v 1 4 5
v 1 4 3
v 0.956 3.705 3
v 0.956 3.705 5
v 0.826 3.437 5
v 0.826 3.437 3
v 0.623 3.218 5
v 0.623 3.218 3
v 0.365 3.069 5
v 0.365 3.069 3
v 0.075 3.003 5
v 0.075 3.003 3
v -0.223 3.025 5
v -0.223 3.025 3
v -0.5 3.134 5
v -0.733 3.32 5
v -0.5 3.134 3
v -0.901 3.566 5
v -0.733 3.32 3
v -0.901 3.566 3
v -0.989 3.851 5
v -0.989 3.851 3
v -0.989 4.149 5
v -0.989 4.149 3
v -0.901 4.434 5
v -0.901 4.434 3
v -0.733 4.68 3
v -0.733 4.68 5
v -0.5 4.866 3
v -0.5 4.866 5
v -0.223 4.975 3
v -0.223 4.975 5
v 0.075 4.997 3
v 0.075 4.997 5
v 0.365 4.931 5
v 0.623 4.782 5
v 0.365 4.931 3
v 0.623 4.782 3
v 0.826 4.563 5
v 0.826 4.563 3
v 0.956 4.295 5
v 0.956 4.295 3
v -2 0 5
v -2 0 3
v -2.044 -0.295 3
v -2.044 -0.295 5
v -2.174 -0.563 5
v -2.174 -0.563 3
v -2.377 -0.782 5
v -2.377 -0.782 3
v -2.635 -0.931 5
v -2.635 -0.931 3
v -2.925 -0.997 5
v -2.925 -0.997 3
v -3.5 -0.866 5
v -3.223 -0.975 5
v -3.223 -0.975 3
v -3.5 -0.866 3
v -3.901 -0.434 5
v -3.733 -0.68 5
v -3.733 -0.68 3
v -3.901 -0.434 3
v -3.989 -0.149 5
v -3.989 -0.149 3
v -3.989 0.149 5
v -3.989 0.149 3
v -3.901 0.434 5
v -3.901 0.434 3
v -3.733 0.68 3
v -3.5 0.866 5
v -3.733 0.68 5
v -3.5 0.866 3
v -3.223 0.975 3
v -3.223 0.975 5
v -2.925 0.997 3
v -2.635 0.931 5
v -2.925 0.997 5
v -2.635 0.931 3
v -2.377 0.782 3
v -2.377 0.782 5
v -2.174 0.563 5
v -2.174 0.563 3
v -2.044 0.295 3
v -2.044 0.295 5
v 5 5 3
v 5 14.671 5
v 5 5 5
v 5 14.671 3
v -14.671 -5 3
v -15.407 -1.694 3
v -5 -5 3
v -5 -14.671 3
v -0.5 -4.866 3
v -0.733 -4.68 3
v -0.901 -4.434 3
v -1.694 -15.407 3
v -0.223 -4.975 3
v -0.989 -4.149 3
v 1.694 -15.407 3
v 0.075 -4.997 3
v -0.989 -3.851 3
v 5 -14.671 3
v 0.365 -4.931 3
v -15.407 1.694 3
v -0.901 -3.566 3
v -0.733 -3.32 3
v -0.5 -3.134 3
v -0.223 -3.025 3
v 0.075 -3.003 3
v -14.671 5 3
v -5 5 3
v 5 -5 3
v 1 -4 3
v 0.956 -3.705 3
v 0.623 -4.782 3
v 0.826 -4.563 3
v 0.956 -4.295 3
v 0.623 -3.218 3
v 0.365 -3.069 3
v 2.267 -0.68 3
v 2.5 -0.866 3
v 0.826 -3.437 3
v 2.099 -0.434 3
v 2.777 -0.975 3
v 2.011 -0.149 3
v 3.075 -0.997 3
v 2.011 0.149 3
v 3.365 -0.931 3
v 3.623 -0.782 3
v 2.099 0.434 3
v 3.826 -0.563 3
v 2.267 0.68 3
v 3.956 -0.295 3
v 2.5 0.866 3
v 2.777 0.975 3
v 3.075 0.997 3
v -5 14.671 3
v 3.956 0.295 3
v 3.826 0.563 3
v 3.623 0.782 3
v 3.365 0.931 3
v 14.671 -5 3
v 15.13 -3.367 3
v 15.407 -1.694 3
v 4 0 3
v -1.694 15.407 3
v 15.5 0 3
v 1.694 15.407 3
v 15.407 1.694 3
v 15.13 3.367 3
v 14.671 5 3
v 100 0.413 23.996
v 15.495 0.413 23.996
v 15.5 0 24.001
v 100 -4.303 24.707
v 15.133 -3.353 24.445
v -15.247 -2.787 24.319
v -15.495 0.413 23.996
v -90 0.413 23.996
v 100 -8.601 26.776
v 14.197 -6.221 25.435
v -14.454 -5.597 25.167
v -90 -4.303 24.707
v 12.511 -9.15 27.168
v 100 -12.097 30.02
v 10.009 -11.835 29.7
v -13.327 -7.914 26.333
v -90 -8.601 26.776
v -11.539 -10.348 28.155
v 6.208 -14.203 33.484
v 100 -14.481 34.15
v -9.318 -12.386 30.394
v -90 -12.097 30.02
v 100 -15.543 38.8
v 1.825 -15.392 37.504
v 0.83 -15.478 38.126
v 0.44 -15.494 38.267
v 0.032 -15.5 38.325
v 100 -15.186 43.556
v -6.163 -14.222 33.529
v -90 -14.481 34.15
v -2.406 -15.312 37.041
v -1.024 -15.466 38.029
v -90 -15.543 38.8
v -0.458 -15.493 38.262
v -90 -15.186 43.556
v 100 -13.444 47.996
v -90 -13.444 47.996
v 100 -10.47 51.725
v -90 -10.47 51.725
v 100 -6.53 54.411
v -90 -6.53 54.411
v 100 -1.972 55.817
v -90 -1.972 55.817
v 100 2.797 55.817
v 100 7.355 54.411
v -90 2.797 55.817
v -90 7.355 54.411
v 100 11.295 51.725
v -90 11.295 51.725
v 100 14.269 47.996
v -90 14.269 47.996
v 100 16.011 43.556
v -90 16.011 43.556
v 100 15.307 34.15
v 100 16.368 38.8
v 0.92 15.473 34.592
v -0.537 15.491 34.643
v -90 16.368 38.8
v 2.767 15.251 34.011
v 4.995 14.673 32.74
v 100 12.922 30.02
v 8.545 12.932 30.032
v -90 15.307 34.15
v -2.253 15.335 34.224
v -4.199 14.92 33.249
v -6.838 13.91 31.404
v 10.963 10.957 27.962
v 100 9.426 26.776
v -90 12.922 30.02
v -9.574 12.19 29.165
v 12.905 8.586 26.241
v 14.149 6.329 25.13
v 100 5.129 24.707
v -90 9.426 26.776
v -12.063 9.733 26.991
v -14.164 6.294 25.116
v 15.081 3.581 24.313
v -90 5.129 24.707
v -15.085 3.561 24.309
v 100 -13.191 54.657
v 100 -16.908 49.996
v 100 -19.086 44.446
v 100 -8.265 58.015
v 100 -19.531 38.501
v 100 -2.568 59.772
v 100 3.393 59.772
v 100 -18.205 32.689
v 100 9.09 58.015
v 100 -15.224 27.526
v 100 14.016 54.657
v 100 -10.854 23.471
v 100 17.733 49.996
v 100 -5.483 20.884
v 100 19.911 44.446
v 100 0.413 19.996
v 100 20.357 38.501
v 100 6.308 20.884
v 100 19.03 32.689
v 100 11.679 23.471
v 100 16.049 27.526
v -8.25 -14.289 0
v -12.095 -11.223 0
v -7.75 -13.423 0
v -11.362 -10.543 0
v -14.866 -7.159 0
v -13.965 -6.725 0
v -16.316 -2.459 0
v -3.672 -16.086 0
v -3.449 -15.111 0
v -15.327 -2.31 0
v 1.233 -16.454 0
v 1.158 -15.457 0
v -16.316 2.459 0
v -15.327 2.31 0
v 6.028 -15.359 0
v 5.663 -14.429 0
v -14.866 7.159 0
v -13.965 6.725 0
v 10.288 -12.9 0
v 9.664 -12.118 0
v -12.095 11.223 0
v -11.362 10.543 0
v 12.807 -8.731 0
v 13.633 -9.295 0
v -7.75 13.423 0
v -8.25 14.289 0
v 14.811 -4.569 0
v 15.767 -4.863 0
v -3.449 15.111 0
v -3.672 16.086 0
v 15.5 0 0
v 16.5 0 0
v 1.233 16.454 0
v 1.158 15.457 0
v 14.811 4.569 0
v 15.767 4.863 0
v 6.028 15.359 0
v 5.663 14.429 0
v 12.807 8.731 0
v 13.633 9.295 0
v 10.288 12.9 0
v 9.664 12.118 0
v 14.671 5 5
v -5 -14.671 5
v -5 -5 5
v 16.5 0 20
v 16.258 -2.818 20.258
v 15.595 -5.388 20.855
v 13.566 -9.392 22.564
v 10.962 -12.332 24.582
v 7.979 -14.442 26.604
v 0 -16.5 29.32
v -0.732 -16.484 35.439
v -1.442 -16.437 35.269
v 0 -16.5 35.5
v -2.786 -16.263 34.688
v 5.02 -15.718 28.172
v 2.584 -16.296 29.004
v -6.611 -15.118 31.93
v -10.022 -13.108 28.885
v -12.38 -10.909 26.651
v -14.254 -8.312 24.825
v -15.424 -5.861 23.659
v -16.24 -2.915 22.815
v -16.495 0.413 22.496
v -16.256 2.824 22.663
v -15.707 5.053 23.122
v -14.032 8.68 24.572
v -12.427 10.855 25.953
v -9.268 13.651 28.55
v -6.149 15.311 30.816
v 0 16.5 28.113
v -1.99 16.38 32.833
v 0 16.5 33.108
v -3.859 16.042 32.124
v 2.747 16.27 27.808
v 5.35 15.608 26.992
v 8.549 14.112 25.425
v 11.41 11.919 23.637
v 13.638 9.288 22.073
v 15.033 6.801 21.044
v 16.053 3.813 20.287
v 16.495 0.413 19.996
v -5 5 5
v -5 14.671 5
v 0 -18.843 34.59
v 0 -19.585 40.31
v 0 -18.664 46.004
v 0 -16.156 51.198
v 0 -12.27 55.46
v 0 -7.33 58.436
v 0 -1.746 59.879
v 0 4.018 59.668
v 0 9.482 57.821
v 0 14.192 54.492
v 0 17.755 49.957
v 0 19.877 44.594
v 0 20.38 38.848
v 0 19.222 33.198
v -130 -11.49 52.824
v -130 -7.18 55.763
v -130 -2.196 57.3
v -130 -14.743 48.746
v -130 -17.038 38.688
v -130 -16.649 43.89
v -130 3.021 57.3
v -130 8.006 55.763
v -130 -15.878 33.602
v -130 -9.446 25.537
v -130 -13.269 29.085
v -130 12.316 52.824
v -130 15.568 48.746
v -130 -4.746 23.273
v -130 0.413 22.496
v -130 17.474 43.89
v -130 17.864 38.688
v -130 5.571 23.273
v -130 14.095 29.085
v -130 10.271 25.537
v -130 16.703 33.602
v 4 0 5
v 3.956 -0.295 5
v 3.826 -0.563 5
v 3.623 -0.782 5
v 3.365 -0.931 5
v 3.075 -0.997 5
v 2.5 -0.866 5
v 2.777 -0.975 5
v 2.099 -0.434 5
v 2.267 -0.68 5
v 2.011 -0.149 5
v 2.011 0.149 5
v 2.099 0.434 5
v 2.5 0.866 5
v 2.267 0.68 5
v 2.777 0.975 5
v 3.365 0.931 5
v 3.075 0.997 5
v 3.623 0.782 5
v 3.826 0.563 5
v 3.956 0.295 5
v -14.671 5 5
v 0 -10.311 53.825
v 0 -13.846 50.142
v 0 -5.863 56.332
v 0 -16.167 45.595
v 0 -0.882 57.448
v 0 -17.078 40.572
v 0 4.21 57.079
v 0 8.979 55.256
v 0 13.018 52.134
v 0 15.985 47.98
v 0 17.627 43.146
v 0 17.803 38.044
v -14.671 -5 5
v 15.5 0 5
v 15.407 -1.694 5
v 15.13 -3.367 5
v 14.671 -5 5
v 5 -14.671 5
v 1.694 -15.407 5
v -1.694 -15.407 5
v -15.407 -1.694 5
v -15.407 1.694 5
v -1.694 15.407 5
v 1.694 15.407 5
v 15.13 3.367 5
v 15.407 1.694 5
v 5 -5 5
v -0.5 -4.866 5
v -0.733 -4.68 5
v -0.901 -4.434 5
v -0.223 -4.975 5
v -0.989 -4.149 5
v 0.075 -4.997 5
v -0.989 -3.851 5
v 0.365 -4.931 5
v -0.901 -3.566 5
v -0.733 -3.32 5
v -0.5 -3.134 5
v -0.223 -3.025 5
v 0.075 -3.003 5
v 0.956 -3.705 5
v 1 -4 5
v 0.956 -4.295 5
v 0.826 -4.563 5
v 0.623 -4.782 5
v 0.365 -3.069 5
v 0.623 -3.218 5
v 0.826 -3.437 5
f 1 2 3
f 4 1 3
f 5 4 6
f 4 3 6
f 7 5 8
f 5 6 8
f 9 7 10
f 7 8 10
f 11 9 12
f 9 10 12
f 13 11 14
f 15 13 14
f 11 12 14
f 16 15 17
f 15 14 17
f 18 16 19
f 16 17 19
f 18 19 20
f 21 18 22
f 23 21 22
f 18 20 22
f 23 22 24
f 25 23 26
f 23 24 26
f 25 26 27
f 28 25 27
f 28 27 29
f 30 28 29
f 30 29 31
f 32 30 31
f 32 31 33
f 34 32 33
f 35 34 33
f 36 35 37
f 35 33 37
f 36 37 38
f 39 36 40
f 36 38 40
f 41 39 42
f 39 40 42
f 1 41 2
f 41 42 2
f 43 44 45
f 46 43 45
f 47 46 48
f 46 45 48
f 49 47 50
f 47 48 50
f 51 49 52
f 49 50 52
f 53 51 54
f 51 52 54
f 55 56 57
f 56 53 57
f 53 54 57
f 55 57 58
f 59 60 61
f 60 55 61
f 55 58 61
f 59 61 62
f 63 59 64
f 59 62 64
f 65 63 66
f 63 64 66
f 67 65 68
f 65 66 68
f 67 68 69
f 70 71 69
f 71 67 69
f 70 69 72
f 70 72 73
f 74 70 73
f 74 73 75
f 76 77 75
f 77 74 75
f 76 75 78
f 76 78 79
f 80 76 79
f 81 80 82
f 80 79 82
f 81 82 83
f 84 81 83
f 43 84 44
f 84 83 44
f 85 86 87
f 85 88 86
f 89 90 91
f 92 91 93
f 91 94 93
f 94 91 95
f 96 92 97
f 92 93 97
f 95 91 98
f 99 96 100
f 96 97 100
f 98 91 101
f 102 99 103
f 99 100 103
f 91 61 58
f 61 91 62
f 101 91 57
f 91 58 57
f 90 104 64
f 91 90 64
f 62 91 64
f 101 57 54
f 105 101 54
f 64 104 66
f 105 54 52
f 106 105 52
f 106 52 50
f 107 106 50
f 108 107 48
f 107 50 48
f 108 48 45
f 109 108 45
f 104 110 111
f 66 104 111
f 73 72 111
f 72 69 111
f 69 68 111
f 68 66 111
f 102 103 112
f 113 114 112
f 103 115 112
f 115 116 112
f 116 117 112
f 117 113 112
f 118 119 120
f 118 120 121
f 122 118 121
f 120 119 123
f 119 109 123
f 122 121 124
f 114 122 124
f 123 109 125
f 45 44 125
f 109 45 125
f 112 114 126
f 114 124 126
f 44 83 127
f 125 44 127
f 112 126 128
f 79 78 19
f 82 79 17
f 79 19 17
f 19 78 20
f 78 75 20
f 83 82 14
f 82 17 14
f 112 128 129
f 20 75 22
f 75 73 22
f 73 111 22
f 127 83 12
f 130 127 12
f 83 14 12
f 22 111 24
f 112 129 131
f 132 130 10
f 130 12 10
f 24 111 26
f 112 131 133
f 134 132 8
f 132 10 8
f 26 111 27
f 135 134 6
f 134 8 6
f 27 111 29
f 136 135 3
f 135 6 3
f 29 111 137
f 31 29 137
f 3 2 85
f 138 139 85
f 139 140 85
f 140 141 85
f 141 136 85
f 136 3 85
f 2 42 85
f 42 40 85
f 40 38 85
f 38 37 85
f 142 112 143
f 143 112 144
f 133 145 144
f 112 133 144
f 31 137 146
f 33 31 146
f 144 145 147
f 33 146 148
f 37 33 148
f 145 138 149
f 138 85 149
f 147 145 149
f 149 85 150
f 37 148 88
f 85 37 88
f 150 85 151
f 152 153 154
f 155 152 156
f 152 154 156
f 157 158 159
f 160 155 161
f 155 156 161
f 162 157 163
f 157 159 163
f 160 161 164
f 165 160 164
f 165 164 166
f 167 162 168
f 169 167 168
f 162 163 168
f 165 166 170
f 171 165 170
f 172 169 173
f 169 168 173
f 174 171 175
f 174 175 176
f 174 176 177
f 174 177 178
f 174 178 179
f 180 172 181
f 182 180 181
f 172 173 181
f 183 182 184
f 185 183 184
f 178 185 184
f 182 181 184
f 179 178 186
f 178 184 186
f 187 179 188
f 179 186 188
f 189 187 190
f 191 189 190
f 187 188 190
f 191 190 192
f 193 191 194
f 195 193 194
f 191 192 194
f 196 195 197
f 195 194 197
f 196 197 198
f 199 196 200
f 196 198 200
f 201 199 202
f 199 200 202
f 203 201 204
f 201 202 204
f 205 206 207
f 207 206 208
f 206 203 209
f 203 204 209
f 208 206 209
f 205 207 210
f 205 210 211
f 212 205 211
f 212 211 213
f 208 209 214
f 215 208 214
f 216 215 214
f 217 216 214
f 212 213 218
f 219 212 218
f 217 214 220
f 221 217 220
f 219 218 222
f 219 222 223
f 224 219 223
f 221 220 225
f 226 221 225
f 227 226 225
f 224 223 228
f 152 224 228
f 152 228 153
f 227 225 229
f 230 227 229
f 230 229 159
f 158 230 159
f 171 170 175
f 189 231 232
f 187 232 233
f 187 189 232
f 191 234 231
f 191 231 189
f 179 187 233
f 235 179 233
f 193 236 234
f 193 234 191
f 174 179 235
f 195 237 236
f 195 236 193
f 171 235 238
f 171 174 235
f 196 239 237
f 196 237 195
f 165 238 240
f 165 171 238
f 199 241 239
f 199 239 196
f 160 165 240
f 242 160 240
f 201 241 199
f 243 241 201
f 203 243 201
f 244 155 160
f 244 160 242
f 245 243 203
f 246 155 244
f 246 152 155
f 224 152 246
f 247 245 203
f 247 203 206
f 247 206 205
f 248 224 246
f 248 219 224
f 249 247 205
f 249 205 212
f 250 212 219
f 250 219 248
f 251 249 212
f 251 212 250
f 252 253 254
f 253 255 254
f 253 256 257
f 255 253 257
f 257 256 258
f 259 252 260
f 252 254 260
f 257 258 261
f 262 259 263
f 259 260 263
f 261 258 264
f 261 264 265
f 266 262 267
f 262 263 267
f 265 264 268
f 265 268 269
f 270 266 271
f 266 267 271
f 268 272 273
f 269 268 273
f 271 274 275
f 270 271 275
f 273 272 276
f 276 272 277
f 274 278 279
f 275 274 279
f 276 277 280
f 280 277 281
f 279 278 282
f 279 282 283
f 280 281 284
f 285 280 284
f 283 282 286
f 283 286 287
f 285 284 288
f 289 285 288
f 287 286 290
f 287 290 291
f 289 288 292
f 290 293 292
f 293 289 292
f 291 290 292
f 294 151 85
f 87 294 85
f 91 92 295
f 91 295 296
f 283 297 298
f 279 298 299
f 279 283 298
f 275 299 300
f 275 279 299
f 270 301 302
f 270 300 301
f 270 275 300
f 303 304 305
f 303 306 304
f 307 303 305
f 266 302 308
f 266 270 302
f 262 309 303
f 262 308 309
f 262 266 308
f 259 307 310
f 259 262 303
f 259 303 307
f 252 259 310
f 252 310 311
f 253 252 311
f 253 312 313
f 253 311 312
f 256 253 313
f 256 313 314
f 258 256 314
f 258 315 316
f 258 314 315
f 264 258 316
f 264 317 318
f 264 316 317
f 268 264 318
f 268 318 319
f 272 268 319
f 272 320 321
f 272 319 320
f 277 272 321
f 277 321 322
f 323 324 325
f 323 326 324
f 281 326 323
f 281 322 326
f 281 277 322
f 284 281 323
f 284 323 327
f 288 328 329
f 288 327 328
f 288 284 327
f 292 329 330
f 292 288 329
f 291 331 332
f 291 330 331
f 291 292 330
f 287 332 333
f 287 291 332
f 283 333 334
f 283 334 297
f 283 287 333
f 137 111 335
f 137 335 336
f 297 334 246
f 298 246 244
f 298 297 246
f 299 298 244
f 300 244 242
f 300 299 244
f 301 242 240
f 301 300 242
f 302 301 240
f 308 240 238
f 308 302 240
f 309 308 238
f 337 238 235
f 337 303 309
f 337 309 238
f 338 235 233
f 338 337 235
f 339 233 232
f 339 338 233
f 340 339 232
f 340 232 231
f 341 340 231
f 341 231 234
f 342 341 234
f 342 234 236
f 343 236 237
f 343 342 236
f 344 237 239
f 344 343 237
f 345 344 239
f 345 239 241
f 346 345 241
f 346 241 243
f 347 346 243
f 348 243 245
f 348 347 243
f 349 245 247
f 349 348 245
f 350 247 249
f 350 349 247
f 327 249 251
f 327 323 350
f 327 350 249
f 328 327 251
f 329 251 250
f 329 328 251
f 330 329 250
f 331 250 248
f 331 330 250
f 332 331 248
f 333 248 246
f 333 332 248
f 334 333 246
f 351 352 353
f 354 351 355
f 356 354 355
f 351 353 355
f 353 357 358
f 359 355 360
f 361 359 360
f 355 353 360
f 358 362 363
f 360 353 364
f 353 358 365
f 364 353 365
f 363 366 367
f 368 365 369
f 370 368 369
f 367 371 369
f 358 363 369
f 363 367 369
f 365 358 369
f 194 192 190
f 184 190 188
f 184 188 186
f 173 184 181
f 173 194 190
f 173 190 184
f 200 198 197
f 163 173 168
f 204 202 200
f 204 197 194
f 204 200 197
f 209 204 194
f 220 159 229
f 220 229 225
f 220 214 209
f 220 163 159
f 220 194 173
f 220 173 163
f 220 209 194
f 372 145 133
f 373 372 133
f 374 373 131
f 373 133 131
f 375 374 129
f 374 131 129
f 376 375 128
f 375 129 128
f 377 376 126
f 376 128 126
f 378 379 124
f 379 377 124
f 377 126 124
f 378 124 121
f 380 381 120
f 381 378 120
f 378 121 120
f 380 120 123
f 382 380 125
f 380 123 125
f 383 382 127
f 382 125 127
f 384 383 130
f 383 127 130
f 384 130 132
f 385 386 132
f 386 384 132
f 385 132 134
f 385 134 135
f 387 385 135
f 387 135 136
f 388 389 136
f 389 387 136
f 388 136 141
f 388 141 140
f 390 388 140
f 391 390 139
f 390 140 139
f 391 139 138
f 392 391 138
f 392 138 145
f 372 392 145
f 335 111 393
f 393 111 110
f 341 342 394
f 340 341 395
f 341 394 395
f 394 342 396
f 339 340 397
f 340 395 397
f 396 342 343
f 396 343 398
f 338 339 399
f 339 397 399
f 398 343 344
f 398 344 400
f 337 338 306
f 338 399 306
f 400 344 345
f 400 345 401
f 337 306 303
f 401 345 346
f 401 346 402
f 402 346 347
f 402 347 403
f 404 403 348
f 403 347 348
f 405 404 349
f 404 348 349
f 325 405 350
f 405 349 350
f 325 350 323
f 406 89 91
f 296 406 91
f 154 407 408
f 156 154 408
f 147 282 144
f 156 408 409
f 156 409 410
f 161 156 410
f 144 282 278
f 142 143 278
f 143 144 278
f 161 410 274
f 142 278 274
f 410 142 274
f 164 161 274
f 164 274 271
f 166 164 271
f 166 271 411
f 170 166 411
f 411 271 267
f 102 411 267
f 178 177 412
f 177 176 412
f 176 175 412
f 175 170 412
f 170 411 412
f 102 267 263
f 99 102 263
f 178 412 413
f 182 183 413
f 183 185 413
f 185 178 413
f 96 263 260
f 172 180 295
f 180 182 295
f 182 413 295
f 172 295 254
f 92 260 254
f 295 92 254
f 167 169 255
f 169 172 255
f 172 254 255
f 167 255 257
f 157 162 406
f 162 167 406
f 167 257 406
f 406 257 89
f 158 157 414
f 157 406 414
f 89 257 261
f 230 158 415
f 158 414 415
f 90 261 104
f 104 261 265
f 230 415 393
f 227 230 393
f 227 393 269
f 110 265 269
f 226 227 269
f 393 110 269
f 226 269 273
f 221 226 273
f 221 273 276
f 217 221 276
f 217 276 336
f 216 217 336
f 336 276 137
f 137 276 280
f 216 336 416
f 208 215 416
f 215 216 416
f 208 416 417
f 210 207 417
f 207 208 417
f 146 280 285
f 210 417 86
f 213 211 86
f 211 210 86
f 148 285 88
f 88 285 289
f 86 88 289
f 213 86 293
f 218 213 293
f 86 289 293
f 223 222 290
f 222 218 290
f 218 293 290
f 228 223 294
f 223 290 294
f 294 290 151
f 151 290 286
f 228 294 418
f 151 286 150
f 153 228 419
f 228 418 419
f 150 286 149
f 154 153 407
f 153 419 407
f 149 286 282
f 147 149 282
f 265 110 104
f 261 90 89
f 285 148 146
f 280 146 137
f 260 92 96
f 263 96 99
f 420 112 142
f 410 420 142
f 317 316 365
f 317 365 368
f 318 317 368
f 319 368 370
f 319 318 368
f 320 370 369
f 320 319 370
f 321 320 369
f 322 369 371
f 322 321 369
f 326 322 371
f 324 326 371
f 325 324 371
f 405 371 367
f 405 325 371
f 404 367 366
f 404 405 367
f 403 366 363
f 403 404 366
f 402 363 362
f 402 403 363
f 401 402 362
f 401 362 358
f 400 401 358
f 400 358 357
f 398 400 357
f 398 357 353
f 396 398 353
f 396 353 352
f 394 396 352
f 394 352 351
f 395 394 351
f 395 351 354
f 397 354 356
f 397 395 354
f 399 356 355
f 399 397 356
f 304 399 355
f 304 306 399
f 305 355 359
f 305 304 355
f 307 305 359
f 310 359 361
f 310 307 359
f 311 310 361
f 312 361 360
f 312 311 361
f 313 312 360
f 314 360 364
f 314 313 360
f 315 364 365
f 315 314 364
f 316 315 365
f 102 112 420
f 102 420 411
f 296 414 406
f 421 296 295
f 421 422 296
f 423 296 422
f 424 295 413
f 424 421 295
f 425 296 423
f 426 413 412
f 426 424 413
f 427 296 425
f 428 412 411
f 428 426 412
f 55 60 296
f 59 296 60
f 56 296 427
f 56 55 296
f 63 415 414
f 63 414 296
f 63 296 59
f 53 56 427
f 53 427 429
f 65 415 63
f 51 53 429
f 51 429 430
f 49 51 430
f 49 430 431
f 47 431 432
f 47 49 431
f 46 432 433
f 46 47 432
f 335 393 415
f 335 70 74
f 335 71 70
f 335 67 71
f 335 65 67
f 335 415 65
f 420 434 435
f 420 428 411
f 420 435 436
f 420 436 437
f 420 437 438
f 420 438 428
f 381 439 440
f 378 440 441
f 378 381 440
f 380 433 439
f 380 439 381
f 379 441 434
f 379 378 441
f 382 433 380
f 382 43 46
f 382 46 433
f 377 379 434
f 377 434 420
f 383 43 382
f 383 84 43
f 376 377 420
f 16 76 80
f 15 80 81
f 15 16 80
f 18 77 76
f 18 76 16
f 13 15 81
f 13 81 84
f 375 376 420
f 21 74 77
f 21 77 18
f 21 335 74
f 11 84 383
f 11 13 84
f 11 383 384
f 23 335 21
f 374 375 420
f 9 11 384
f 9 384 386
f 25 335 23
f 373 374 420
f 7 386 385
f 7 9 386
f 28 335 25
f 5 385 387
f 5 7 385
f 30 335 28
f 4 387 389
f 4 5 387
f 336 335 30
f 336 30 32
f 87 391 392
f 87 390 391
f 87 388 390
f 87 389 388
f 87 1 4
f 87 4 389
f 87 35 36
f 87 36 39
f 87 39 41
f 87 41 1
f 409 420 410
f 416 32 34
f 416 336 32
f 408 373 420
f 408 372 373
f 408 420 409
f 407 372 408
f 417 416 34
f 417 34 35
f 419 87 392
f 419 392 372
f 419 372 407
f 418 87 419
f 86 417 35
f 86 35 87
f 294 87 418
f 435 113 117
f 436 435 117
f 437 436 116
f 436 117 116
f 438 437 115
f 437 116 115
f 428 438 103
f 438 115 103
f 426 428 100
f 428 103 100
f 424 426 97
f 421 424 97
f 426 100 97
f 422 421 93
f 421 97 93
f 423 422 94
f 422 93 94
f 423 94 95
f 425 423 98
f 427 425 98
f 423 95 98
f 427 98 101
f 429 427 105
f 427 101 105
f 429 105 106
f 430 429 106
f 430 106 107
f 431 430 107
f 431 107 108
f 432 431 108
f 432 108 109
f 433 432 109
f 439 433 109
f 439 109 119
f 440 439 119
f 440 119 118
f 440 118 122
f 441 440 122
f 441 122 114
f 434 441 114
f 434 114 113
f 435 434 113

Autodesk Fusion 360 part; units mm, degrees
sketch "Sketch1" plane through (0, 0, 0) normal (0, 0, 1) x (1, 0, 0)
  circle A0 centre (0, 0) radius 16.5
  circle A1 centre (0, 0) radius 15.5
  line L0 (-25, -5) -> (25, -5)
  line L1 (25, -5) -> (25, 5)
  line L2 (25, 5) -> (-25, 5)
  line L3 (-25, 5) -> (-25, -5)
  line L4 (-25, -5) -> (25, 5) construction
  line L5 (25, -5) -> (-25, 5) construction
  line L6 (-5, 25) -> (5, 25)
  line L7 (5, 25) -> (5, -25)
  line L8 (5, -25) -> (-5, -25)
  line L9 (-5, -25) -> (-5, 25)
  line L10 (-5, 25) -> (5, -25) construction
  line L11 (5, 25) -> (-5, -25) construction
  circle A2 centre (0, 4) radius 1
  circle A3 centre (0, -4) radius 1
  circle A4 centre (-3, 0) radius 1
  circle A5 centre (3, 0) radius 1
  dimension "d1" = 33
  dimension "d15" = 31
  dimension "d18" = 50
  dimension "d19" = 10
  dimension "d20" = 10
  dimension "d21" = 50
  dimension "d22" = 2
  dimension "d23" = 2
  dimension "d25" = 2
  dimension "d26" = 4
  dimension "d27" = 8
  dimension "d28" = 2
  dimension "d29" = 3
  dimension "d30" = 6
extrude "Extrude1" add sketch "Sketch1" along normal blind 37 contours A0 A1 L0 L2 | A0 A1 L2 L7 | A0 A1 L0 L7 | A0 A1 L7 L9 | A1 L2 L7 | A1 L0 L2 L7 | A0 A1 L7 L9 | A1 L0 L7 | A0 A1 L2 L9 | A1 L2 L7 L9 | A2 | A3 | L0 L2 L7 L9 | A0 A1 L0 L9 | A1 L0 L7 L9 | A0 A1 L0 L2 | A1 L2 L9 | A1 L0 L9 | A1 L0 L2 L9 | A4 | A5
sketch "Sketch2" plane through (0, 0, 0) normal (1, 0, 0) x (0, 0, -1)
  circle A0 centre (-39.9957, 0.4126) radius 20
  circle A1 centre (-39.9957, 0.4126) radius 17.5
  circle A2 centre (-39.9957, 0.4126) radius 16
  dimension "d4" = 40
  dimension "d7" = 35
  dimension "d10" = 32
extrude "Extrude2" add sketch "Sketch2" along normal blind 100 contours A0 | A1 | A2
extrude "Extrude3" add sketch "Sketch2" against normal blind 130 contours A1 | A2
extrude "Extrude4" cut sketch "Sketch2" along normal blind 140 and the other way blind 90 contours A2
extrude "Extrude5" cut sketch "Sketch1" along normal blind 40 contours A1 L2 L7 | A1 L0 L2 L7 | A1 L0 L7 | A1 L2 L7 L9 | A2 | A3 | L0 L2 L7 L9 | A1 L0 L7 L9 | A1 L2 L9 | A1 L0 L9 | A1 L0 L2 L9 | A4 | A5
extrude "Extrude6" add sketch "Sketch1" along normal blind 2 from surface at 3 contours A1 L0 L2 L7 | A1 L2 L7 L9 | L0 L2 L7 L9 | A1 L0 L7 L9 | A1 L0 L2 L9
